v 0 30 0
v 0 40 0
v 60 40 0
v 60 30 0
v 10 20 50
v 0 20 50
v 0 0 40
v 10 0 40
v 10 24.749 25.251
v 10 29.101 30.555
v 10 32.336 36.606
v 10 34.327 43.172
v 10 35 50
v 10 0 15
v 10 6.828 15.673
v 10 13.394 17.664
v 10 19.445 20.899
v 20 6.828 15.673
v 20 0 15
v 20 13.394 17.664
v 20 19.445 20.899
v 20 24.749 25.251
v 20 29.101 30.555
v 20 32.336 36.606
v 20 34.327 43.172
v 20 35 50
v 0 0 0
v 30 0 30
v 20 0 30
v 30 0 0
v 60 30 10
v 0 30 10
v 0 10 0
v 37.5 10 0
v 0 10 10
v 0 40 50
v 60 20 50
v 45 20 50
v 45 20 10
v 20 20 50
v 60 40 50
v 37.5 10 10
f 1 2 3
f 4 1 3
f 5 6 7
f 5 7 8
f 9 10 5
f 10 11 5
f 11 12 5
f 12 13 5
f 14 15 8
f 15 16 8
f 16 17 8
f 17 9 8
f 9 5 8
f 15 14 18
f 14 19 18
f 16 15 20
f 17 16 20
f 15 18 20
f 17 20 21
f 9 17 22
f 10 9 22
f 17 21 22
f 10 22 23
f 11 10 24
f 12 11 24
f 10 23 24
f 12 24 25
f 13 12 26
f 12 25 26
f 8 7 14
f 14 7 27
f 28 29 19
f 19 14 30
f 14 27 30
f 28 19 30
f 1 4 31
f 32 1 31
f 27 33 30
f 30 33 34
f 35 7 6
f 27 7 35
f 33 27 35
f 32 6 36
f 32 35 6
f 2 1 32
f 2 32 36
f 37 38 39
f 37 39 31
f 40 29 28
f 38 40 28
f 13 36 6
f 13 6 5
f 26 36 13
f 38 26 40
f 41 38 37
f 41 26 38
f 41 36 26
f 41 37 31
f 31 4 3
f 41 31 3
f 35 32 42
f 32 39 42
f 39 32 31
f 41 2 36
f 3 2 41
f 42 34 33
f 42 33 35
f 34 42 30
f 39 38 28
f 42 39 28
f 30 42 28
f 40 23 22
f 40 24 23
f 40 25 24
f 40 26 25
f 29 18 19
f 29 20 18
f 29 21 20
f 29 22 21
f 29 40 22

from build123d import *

# Parameters (mm, degrees)
F0_W      = 60
F0_H      = 40
F1_DEPTH  = 50
F2_W      = 10
F2_H      = 35
F4_W      = 10
F4_H      = 10
F10_DEPTH = 50.001
F11_W     = 15
F11_H     = 20
F12_DEPTH = 50.001
F7_W      = 40
F7_H      = 20
F14_W     = 10
F14_H     = 10
F15_DEPTH = 60.001
F14_W_2   = 20
F19_DEPTH = 60.001


with BuildPart() as f1:
    # F0 (on Top) → F1 (new body)
    with BuildSketch(Plane.XY):
        with Locations((30, 20)):
            Rectangle(F0_W, F0_H)
    extrude(amount=F1_DEPTH)

    # F2 (on face) → F3 (revolve, cut)
    with BuildSketch(Plane.XY.offset(50)):
        with Locations((15, 17.5)):
            Rectangle(F2_W, F2_H)
    revolve(axis=Axis((15, 0, 50), (1, 0, 0)), mode=Mode.SUBTRACT)

    # F6: sweep along a path in F5
    with BuildLine(Plane(origin=(0, 0, 0), x_dir=(0, -1, 0), z_dir=(-1, 0, 0))) as f6_path:
        Line((0, 40), (-20, 50))
    # F4 (on face) → F6 (sweep, cut)
    with BuildSketch(Plane.XZ):
        with Locations((5, 45)):
            Rectangle(F4_W, F4_H)
    sweep(path=f6_path.line, mode=Mode.SUBTRACT)

    # F9 (on face) → F10 (cut, through all)
    with BuildSketch(Plane.XY.offset(50)):
        Polygon((45, 20), (30, 0), (45, 0), align=None)
    extrude(amount=-F10_DEPTH, mode=Mode.SUBTRACT)

    # F11 (on face) → F12 (cut, through all)
    with BuildSketch(Plane.XY.offset(50)):
        with Locations((52.5, 10)):
            Rectangle(F11_W, F11_H)
    extrude(amount=-F12_DEPTH, mode=Mode.SUBTRACT)

    # F13: sweep along a path in F8
    with BuildLine(Plane.YZ.offset(60)) as f13_path:
        Line((0, 30), (20, 50))
    # F7 (on face) → F13 (sweep, cut)
    with BuildSketch(Plane.XZ):
        with Locations((40, 40)):
            Rectangle(F7_W, F7_H)
    sweep(path=f13_path.line, mode=Mode.SUBTRACT)

    # F14 (on face) → F15 (cut, through all)
    with BuildSketch(Plane.YZ.offset(60)):
        with Locations((25, 5)):
            Rectangle(F14_W, F14_H)
        with Locations((15, 5)):
            Rectangle(F14_W, F14_H)
    extrude(amount=-F15_DEPTH, mode=Mode.SUBTRACT)

    # F18: sweep along a path in F17
    with BuildLine(Plane.YZ.offset(60)) as f18_path:
        Line((30, 10), (20, 50))
    # F16 (on face) → F18 (sweep, cut)
    with BuildSketch(Plane(origin=(0, 0, 10), x_dir=(1, 0, 0), z_dir=(0, 0, -1))):
        Polygon((60, -20), (45, -20), (60, -30), align=None)
    sweep(path=f18_path.line, mode=Mode.SUBTRACT)

    # F14 (on face) → F19 (cut, through all)
    with BuildSketch(Plane.YZ.offset(60)):
        with Locations((20, 5)):
            Rectangle(F14_W_2, F14_H)
        with Locations((15, 5)):
            Rectangle(F14_W, F14_H)
    extrude(amount=-F19_DEPTH, mode=Mode.SUBTRACT)


solid = f1.part
